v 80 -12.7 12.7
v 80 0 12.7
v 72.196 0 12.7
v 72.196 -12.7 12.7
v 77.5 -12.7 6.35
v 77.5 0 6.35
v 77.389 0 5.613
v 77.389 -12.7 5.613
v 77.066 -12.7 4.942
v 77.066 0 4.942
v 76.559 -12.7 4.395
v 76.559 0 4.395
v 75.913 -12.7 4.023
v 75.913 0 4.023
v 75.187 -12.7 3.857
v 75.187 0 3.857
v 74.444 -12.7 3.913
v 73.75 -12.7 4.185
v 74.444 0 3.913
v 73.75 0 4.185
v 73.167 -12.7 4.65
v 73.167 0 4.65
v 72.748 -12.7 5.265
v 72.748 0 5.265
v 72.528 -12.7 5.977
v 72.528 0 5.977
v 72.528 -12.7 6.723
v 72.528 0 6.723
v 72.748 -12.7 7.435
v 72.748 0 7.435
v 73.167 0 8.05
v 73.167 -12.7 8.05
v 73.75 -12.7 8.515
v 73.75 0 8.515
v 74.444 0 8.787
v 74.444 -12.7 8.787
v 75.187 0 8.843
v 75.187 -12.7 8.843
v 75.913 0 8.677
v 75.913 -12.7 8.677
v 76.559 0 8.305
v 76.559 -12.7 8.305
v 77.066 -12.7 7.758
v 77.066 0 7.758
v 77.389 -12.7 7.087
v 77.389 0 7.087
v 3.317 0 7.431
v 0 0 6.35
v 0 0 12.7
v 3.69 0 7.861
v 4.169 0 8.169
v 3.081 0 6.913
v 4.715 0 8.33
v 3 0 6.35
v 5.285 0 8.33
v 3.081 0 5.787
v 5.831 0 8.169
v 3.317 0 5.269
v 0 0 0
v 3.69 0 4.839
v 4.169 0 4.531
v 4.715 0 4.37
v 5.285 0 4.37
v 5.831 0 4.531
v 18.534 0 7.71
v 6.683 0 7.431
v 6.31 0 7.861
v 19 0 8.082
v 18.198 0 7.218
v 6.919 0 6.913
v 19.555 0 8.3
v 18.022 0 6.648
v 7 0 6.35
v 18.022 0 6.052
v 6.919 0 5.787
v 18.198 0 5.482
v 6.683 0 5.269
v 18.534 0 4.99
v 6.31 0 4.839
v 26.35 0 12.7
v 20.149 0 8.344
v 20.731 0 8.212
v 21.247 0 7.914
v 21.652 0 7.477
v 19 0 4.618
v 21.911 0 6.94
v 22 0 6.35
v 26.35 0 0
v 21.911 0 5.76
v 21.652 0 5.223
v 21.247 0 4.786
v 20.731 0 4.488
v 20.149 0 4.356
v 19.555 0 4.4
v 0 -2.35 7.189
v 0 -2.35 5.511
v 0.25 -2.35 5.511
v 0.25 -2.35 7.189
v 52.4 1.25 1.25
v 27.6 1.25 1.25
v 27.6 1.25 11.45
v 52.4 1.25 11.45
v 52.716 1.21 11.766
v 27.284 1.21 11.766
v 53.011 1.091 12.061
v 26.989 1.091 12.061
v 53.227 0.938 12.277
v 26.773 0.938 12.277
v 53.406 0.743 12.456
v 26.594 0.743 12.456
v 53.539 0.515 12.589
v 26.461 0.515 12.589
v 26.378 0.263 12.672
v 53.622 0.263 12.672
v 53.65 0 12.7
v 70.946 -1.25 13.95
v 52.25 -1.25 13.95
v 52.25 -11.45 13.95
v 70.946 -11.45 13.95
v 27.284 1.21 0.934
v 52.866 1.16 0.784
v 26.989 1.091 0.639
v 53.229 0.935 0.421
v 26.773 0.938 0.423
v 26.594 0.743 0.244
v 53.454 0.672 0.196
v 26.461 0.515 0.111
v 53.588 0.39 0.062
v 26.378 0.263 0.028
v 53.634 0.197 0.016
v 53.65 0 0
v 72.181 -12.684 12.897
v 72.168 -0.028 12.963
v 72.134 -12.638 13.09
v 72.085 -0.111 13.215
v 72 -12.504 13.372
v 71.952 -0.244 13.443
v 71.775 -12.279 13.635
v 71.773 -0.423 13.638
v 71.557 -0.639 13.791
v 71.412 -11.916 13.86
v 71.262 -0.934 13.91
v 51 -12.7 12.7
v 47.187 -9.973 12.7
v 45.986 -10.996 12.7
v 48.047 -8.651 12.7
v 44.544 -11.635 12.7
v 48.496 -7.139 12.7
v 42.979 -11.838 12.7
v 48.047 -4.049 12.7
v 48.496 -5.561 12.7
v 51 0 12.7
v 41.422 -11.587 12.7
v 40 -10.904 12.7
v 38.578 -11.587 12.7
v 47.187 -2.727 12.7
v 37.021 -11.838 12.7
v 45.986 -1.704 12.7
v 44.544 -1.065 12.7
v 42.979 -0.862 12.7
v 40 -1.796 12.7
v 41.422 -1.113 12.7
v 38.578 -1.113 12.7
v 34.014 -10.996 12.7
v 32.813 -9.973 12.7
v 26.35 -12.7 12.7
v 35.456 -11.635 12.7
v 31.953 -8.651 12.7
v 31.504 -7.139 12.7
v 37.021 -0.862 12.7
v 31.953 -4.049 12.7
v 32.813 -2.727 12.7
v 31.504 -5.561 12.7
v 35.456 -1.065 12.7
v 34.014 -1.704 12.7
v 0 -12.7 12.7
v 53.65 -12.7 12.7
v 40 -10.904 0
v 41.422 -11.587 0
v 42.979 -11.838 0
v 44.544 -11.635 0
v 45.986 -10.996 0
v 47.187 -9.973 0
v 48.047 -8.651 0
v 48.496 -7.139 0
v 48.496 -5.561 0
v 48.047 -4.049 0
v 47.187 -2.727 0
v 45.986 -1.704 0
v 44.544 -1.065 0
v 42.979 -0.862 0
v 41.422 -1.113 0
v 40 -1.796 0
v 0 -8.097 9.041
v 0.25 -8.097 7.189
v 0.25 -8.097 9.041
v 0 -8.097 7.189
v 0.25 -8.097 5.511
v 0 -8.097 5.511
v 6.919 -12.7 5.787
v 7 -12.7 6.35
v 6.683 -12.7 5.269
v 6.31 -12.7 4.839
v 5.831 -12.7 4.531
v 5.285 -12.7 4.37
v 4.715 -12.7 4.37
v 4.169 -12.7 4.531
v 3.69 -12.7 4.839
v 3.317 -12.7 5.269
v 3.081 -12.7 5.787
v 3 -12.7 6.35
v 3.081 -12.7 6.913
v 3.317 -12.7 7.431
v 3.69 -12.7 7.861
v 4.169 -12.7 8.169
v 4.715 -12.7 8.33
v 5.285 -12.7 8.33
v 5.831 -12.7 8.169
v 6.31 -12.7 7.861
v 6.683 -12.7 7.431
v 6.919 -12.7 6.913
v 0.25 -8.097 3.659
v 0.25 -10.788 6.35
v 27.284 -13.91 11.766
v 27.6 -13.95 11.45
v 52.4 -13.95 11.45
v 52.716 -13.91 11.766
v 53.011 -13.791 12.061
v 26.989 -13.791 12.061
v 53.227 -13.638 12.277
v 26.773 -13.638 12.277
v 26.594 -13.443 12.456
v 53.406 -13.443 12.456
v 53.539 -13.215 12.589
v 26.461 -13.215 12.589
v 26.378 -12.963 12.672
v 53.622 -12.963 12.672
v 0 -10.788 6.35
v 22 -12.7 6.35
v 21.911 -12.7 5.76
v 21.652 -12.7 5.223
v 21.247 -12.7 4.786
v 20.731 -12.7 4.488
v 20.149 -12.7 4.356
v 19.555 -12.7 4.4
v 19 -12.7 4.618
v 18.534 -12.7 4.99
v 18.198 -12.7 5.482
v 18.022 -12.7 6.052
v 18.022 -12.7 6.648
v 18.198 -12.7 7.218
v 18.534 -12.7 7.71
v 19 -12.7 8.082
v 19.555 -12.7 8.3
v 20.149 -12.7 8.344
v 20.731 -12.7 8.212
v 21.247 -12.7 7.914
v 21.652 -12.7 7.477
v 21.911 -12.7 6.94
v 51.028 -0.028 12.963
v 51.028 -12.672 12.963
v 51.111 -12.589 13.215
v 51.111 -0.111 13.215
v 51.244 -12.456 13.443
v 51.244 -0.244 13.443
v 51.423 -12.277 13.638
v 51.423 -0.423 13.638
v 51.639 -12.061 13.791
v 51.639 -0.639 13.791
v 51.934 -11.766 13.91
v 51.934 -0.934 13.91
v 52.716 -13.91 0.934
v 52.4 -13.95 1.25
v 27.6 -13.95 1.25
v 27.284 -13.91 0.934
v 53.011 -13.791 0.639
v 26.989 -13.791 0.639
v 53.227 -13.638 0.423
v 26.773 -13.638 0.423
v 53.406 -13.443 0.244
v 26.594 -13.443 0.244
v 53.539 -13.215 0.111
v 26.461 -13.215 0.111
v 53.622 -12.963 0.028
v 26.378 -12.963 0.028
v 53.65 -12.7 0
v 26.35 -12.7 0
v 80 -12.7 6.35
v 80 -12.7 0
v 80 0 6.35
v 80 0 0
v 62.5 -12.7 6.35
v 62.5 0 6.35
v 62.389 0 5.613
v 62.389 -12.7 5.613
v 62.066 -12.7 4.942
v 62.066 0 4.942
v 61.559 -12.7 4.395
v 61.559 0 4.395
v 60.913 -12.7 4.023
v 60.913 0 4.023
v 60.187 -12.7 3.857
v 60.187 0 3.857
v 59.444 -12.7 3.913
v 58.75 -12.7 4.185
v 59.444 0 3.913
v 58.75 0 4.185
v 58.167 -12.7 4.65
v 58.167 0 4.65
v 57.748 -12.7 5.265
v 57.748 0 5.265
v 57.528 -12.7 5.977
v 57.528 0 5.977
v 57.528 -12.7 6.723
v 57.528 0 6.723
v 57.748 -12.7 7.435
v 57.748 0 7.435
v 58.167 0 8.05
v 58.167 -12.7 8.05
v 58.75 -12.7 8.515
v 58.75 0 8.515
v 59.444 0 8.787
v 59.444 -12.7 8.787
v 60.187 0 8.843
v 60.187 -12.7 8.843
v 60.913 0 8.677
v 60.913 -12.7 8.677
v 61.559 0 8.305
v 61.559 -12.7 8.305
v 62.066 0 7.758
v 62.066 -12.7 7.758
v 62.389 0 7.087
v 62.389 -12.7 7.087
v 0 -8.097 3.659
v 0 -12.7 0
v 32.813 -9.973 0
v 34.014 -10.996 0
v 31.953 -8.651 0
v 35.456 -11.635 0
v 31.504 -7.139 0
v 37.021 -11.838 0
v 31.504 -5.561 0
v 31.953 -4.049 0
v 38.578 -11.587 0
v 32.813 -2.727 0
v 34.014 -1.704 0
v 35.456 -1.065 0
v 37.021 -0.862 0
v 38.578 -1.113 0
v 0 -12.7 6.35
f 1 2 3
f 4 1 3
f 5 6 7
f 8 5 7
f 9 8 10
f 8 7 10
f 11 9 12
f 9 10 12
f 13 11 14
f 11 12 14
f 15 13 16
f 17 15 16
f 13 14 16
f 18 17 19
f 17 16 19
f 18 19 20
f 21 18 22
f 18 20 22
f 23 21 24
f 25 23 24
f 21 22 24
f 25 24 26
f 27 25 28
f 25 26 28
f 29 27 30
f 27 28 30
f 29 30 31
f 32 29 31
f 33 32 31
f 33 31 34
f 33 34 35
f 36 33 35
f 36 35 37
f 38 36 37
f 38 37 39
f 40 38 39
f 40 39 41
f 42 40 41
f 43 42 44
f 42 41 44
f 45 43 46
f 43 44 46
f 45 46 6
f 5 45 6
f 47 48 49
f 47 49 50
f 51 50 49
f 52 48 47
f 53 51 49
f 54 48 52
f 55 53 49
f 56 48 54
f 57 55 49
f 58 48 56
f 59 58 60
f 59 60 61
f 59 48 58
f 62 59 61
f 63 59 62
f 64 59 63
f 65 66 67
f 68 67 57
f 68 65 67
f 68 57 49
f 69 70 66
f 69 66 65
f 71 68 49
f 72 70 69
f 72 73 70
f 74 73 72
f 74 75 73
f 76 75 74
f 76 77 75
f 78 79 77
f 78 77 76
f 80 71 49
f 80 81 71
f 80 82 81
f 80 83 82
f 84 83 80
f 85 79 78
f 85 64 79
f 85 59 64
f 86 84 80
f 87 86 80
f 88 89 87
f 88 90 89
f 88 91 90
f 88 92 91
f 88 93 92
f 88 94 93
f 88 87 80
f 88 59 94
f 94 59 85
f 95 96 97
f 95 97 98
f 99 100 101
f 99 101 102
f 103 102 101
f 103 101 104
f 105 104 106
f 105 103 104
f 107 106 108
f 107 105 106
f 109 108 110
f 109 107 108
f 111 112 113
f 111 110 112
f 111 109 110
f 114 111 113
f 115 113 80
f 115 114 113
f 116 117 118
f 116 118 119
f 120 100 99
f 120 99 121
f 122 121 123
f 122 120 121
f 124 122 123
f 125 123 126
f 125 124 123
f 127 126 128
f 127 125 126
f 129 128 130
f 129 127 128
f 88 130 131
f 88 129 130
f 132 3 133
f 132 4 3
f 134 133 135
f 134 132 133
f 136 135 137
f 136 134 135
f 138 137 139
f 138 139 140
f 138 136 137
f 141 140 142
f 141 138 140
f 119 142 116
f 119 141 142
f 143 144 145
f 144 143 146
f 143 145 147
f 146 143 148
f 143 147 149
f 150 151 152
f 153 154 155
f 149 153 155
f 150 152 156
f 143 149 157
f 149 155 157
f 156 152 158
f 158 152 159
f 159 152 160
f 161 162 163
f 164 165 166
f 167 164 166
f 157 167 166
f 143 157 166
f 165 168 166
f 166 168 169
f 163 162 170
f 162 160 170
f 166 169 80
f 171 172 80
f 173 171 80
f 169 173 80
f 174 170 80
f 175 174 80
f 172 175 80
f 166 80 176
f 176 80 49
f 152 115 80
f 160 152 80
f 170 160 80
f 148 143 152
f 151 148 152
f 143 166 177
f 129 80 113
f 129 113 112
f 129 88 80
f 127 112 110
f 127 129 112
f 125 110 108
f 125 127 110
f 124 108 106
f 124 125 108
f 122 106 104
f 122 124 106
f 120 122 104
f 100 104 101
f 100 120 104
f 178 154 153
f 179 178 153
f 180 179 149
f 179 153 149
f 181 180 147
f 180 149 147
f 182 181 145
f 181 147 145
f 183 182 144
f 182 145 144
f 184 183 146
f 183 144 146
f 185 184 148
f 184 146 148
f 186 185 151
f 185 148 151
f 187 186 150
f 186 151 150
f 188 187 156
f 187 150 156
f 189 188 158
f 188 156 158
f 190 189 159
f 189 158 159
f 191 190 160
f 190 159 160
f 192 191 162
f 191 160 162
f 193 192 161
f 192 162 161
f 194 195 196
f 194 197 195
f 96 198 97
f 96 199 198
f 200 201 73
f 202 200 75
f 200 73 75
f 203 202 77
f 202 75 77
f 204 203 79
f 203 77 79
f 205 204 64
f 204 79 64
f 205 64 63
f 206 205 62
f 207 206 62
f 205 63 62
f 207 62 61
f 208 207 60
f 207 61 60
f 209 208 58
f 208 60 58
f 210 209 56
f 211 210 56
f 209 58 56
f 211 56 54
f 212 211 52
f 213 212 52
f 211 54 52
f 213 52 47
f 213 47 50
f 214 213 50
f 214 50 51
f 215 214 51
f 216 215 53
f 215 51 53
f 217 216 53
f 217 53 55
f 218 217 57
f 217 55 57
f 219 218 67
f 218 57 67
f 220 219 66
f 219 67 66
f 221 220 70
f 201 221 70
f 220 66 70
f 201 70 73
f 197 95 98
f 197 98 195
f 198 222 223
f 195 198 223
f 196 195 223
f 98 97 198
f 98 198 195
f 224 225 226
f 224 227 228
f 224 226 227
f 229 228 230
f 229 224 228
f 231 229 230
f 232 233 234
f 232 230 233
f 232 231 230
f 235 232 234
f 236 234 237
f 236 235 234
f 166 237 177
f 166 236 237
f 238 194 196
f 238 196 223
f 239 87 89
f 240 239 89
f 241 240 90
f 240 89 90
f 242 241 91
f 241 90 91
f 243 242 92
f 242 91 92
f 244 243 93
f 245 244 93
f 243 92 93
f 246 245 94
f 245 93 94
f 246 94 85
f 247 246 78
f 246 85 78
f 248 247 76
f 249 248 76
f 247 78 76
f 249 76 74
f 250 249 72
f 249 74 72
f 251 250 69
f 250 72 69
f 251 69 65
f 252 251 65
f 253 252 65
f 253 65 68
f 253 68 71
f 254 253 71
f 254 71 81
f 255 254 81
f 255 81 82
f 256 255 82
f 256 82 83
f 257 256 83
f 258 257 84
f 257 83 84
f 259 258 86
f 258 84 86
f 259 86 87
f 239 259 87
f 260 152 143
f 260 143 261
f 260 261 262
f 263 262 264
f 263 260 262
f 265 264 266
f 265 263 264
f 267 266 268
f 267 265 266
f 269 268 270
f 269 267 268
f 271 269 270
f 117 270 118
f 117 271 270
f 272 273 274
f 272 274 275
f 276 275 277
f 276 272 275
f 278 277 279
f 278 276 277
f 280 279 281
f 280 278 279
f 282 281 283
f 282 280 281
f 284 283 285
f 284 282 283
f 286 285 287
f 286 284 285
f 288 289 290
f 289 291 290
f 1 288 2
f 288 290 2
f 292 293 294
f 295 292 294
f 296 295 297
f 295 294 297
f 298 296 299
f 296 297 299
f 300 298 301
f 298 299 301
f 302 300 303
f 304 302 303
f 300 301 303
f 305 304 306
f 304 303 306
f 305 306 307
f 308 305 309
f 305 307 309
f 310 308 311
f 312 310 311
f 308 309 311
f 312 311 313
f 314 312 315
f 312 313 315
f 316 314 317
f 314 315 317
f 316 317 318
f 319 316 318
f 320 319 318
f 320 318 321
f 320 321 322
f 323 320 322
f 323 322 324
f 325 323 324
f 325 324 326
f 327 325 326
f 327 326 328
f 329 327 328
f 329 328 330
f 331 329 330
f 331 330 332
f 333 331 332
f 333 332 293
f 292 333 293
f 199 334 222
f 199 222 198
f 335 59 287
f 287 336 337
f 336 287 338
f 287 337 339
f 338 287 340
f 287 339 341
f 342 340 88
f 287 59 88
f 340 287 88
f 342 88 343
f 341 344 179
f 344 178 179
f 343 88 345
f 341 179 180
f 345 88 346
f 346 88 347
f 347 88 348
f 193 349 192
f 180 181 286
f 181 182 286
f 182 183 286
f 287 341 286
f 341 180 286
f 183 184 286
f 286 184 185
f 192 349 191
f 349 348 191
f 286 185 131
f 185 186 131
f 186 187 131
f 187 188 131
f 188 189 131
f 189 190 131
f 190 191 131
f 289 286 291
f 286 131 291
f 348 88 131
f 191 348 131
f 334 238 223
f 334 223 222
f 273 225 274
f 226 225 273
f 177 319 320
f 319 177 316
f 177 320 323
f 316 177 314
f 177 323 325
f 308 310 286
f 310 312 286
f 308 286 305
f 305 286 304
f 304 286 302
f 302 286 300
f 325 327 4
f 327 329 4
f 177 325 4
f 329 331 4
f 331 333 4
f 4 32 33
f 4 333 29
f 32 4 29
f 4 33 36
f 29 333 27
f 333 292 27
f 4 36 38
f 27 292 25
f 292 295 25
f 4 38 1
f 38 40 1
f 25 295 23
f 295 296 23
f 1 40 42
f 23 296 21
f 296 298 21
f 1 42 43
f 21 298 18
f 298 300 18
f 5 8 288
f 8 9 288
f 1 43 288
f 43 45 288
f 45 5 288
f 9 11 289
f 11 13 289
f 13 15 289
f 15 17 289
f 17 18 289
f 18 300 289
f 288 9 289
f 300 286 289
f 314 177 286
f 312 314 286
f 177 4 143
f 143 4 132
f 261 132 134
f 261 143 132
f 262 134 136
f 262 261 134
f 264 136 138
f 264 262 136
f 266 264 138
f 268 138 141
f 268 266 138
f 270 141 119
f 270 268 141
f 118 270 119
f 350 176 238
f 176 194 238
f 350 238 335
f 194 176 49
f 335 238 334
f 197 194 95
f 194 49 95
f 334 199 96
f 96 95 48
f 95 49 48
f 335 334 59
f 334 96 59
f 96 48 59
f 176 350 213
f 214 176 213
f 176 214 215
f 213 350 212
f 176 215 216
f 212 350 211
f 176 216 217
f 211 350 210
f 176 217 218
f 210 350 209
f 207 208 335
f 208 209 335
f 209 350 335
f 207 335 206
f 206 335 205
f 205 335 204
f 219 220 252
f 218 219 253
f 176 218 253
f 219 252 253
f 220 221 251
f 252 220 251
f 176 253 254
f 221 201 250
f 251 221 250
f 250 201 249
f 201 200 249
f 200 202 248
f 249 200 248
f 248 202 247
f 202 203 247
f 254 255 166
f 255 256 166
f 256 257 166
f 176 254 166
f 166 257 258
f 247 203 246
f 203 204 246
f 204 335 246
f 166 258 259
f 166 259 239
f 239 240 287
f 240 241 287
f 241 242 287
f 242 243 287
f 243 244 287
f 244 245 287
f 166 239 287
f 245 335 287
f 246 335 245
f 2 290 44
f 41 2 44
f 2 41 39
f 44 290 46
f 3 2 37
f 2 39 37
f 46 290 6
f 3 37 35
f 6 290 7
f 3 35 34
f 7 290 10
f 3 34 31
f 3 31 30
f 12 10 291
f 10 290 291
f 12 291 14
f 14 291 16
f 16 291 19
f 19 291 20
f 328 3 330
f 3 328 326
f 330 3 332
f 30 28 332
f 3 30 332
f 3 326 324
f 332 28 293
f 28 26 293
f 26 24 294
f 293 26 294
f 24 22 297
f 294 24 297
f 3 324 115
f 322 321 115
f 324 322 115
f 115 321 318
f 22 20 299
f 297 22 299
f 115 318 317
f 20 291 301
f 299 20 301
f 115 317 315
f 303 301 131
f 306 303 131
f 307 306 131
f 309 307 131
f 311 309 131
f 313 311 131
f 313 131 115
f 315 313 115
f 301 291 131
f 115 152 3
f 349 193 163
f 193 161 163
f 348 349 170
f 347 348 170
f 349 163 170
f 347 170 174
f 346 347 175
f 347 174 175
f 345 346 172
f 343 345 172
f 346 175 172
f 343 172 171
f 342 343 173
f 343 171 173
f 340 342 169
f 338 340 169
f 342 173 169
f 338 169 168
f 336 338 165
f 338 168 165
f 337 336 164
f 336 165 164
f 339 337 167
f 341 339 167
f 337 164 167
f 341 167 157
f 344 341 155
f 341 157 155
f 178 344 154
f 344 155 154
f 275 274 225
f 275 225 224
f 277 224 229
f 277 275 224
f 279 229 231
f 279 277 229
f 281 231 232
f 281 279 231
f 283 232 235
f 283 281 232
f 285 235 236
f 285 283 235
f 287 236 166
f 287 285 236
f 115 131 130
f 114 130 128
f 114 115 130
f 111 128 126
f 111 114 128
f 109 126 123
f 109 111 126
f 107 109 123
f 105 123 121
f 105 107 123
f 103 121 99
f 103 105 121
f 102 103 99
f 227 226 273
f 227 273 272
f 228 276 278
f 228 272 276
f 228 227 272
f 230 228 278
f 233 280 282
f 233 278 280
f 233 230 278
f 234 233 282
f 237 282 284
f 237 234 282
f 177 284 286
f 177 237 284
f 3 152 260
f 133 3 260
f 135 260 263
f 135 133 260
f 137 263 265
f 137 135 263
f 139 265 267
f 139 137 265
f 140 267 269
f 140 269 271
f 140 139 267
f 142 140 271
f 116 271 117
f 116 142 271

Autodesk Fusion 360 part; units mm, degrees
sketch "Screw Holes" plane through (0, 0, 0) normal (0, 1, 0) x (1, 0, 0)
  line L0 (0, 0) -> (80, 0)
  line L1 (80, 0) -> (80, -12.7)
  line L2 (80, -12.7) -> (0, -12.7)
  line L3 (0, -12.7) -> (0, 0)
  line L4 (0, -6.35) -> (80, -6.35) construction
  circle A0 centre (5, -6.35) radius 2
  circle A1 centre (20, -6.35) radius 2
  circle A2 centre (60, -6.35) radius 2.5
  circle A3 centre (75, -6.35) radius 2.5
  line L5 (5, -6.35) -> (0, -6.35)
  line L6 (75, -6.35) -> (80, -6.35)
  line L7 (5, -6.35) -> (20, -6.35) construction
  line L8 (60, -6.35) -> (75, -6.35) construction
  point P0 (67.5, -6.35)
  point P1 (12.5, -6.35)
  dimension "d1" = 80
  dimension "d2" = 12.7
  dimension "d3" = 4
  dimension "d4" = 4
  dimension "d5" = 5
  dimension "d6" = 5
  dimension "d7" = 40
  dimension "d8" = 15
  dimension "d9" = 15
extrude "Extrude1" add sketch "Screw Holes" against normal blind 12.7 contours A0 | A3 | L0 L1 L2 L3 | A1 | A2
extrude "Extrude2" cut sketch "Screw Holes" against normal through all contours A0 | A3 | A1 | A2
sketch "Loadcell Holes" plane through (0, 0, 12.7) normal (0, 0, 1) x (1, 0, 0)
  line L0 (80, 0) -> (0, 0)
  line L1 (0, 0) -> (0, -12.7)
  line L2 (0, -12.7) -> (80, -12.7)
  line L3 (80, -12.7) -> (80, 0)
  line L4 (40, -12.7) -> (40, 0) construction
  line L5 (0, -6.35) -> (80, -6.35) construction
  circle A0 centre (36.936, -6.35) radius 5.4886
  circle A1 centre (43.064, -6.35) radius 5.4886
  line L6 (36.936, -6.35) -> (43.064, -6.35)
extrude "Extrude3" cut sketch "Loadcell Holes" against normal blind 25 contours A0 A1 L6 | A0 A1 | A0 A1 L6 | A0 A1
sketch "Arrow" plane through (0, 0, 0) normal (-1, 0, 0) x (0, 0, 1)
  line L0 (12.7, 0) -> (0, 0)
  line L1 (0, 0) -> (0, -12.7)
  line L2 (0, -12.7) -> (12.7, -12.7)
  line L3 (12.7, -12.7) -> (12.7, 0)
  line L4 (5.511, -2.3504) -> (7.189, -2.3504)
  line L5 (7.189, -2.3504) -> (7.189, -8.0971)
  line L6 (7.189, -8.0971) -> (9.0409, -8.0971)
  line L7 (9.0409, -8.0971) -> (6.35, -10.7879)
  line L8 (6.35, -10.7879) -> (3.6591, -8.0971)
  line L9 (3.6591, -8.0971) -> (5.511, -8.0971)
  line L10 (5.511, -8.0971) -> (5.511, -2.3504)
  line L11 (6.35, -12.7) -> (6.35, 0) construction
  dimension "d20" = 45
extrude "Extrude4" cut sketch "Arrow" against normal blind 0.25 contours L4 L5 L6 L7 L8 L9 L10
sketch "Sketch5" plane through (0, 0, 0) normal (0, 1, 0) x (1, 0, 0)
  circle A0 centre (20, -6.35) radius 2
  circle A1 centre (60, -6.35) radius 2.5
  circle A2 centre (5, -6.35) radius 2
  circle A3 centre (75, -6.35) radius 2.5
  line L0 (80, -12.7) -> (80, 0)
  line L1 (80, 0) -> (0, 0)
  line L2 (0, 0) -> (0, -12.7)
  line L3 (0, -12.7) -> (80, -12.7)
  line L4 (40, 0) -> (40, -12.7) construction
  line L5 (26.35, 0) -> (53.65, 0)
  line L6 (53.65, 0) -> (53.65, -12.7)
  line L7 (53.65, -12.7) -> (26.35, -12.7)
  line L8 (26.35, -12.7) -> (26.35, 0)
  line L9 (26.35, -6.35) -> (40, -6.35) construction
  line L10 (40, -6.35) -> (53.65, -6.35) construction
  circle A4 centre (20, -6.35) radius 6.35 construction
extrude "Extrude6" add sketch "Sketch5" along normal blind 1.25 contours L1 L3 L5 L6 L7 L8
fillet "Fillet1" radius 1.25 4 edges at (26.35, 1.25, 6.35) (40, 1.25, 12.7) (53.65, 1.25, 6.35) (40, 1.25, 0)
sketch "Sketch6" plane through (0, -12.7, 0) normal (0, -1, 0) x (1, 0, 0)
  line L0 (80, 0) -> (80, 12.7)
  line L1 (80, 12.7) -> (0, 12.7)
  line L2 (0, 12.7) -> (0, 0)
  line L3 (0, 0) -> (80, 0)
  line L4 (26.35, 12.7) -> (26.35, 0)
  line L5 (26.35, 0) -> (0, 0)
  line L6 (0, 0) -> (0, 12.7)
  line L7 (0, 12.7) -> (26.35, 12.7)
  circle A0 centre (20, 6.35) radius 2
  circle A1 centre (5, 6.35) radius 2
  line L8 (53.65, 0) -> (53.65, 12.7)
  line L9 (53.65, 12.7) -> (80, 12.7)
  line L10 (80, 12.7) -> (80, 0)
  line L11 (80, 0) -> (53.65, 0)
  circle A2 centre (75, 6.35) radius 2.5
  circle A3 centre (60, 6.35) radius 2.5
  circle A4 centre (20, 6.35) radius 2
  circle A5 centre (60, 6.35) radius 2.5
  circle A6 centre (5, 6.35) radius 2
  circle A7 centre (75, 6.35) radius 2.5
  line L12 (5, 6.35) -> (20, 6.35) construction
  line L13 (60, 6.35) -> (75, 6.35) construction
  point P0 (67.5, 6.35)
  point P1 (12.5, 6.35)
extrude "Extrude7" add sketch "Sketch6" along normal blind 1.25 contours L1 L3 L4 L8
fillet "Fillet2" radius 1.25 4 edges at (26.35, -13.95, 6.35) (40, -13.95, 0) (53.65, -13.95, 6.35) (40, -13.95, 12.7)
sketch "Sketch7" plane through (0, 0, 12.7) normal (0, 0, 1) x (1, 0, 0)
  line L0 (26.35, -12.7) -> (53.65, -12.7)
  line L1 (53.65, -12.7) -> (80, -12.7)
  line L2 (80, -12.7) -> (80, 0)
  line L3 (80, 0) -> (53.65, 0)
  line L4 (53.65, 0) -> (26.35, 0)
  line L5 (26.35, 0) -> (0, 0)
  line L6 (0, 0) -> (0, -12.7)
  line L7 (0, -12.7) -> (26.35, -12.7)
  arc A0 (40, -1.7962) -> (40, -10.9038) centre (36.936, -6.35) ccw
  arc A1 (40, -10.9038) -> (40, -1.7962) centre (43.064, -6.35) ccw
  line L8 (51, 0) -> (72.1962, 0)
  line L9 (72.1962, 0) -> (72.1962, -12.7)
  line L10 (72.1962, -12.7) -> (51, -12.7)
  line L11 (51, -12.7) -> (51, 0)
extrude "Extrude8" add sketch "Sketch7" along normal blind 1.25 contours L0 L1 L3 L4 L8 L9 L10 L11
fillet "Fillet3" radius 1.25 4 edges at (51, -6.35, 13.95) (61.5981, 0, 13.95) (72.1962, -6.35, 13.95) (61.5981, -12.7, 13.95)
ref_plane "WorkPlane1" through (40, -6.975, 6.35) normal (0, 0, 1) x (-1, 0, 0)
ref_plane "WorkPlane2" through (65.5, -6.35, 6.975) normal (0, 1, 0) x (1, 0, 0)
ref_plane "WorkPlane3" through (40, -6.35, 6.35) normal (-1, 0, 0) x (0, 0, -1)
